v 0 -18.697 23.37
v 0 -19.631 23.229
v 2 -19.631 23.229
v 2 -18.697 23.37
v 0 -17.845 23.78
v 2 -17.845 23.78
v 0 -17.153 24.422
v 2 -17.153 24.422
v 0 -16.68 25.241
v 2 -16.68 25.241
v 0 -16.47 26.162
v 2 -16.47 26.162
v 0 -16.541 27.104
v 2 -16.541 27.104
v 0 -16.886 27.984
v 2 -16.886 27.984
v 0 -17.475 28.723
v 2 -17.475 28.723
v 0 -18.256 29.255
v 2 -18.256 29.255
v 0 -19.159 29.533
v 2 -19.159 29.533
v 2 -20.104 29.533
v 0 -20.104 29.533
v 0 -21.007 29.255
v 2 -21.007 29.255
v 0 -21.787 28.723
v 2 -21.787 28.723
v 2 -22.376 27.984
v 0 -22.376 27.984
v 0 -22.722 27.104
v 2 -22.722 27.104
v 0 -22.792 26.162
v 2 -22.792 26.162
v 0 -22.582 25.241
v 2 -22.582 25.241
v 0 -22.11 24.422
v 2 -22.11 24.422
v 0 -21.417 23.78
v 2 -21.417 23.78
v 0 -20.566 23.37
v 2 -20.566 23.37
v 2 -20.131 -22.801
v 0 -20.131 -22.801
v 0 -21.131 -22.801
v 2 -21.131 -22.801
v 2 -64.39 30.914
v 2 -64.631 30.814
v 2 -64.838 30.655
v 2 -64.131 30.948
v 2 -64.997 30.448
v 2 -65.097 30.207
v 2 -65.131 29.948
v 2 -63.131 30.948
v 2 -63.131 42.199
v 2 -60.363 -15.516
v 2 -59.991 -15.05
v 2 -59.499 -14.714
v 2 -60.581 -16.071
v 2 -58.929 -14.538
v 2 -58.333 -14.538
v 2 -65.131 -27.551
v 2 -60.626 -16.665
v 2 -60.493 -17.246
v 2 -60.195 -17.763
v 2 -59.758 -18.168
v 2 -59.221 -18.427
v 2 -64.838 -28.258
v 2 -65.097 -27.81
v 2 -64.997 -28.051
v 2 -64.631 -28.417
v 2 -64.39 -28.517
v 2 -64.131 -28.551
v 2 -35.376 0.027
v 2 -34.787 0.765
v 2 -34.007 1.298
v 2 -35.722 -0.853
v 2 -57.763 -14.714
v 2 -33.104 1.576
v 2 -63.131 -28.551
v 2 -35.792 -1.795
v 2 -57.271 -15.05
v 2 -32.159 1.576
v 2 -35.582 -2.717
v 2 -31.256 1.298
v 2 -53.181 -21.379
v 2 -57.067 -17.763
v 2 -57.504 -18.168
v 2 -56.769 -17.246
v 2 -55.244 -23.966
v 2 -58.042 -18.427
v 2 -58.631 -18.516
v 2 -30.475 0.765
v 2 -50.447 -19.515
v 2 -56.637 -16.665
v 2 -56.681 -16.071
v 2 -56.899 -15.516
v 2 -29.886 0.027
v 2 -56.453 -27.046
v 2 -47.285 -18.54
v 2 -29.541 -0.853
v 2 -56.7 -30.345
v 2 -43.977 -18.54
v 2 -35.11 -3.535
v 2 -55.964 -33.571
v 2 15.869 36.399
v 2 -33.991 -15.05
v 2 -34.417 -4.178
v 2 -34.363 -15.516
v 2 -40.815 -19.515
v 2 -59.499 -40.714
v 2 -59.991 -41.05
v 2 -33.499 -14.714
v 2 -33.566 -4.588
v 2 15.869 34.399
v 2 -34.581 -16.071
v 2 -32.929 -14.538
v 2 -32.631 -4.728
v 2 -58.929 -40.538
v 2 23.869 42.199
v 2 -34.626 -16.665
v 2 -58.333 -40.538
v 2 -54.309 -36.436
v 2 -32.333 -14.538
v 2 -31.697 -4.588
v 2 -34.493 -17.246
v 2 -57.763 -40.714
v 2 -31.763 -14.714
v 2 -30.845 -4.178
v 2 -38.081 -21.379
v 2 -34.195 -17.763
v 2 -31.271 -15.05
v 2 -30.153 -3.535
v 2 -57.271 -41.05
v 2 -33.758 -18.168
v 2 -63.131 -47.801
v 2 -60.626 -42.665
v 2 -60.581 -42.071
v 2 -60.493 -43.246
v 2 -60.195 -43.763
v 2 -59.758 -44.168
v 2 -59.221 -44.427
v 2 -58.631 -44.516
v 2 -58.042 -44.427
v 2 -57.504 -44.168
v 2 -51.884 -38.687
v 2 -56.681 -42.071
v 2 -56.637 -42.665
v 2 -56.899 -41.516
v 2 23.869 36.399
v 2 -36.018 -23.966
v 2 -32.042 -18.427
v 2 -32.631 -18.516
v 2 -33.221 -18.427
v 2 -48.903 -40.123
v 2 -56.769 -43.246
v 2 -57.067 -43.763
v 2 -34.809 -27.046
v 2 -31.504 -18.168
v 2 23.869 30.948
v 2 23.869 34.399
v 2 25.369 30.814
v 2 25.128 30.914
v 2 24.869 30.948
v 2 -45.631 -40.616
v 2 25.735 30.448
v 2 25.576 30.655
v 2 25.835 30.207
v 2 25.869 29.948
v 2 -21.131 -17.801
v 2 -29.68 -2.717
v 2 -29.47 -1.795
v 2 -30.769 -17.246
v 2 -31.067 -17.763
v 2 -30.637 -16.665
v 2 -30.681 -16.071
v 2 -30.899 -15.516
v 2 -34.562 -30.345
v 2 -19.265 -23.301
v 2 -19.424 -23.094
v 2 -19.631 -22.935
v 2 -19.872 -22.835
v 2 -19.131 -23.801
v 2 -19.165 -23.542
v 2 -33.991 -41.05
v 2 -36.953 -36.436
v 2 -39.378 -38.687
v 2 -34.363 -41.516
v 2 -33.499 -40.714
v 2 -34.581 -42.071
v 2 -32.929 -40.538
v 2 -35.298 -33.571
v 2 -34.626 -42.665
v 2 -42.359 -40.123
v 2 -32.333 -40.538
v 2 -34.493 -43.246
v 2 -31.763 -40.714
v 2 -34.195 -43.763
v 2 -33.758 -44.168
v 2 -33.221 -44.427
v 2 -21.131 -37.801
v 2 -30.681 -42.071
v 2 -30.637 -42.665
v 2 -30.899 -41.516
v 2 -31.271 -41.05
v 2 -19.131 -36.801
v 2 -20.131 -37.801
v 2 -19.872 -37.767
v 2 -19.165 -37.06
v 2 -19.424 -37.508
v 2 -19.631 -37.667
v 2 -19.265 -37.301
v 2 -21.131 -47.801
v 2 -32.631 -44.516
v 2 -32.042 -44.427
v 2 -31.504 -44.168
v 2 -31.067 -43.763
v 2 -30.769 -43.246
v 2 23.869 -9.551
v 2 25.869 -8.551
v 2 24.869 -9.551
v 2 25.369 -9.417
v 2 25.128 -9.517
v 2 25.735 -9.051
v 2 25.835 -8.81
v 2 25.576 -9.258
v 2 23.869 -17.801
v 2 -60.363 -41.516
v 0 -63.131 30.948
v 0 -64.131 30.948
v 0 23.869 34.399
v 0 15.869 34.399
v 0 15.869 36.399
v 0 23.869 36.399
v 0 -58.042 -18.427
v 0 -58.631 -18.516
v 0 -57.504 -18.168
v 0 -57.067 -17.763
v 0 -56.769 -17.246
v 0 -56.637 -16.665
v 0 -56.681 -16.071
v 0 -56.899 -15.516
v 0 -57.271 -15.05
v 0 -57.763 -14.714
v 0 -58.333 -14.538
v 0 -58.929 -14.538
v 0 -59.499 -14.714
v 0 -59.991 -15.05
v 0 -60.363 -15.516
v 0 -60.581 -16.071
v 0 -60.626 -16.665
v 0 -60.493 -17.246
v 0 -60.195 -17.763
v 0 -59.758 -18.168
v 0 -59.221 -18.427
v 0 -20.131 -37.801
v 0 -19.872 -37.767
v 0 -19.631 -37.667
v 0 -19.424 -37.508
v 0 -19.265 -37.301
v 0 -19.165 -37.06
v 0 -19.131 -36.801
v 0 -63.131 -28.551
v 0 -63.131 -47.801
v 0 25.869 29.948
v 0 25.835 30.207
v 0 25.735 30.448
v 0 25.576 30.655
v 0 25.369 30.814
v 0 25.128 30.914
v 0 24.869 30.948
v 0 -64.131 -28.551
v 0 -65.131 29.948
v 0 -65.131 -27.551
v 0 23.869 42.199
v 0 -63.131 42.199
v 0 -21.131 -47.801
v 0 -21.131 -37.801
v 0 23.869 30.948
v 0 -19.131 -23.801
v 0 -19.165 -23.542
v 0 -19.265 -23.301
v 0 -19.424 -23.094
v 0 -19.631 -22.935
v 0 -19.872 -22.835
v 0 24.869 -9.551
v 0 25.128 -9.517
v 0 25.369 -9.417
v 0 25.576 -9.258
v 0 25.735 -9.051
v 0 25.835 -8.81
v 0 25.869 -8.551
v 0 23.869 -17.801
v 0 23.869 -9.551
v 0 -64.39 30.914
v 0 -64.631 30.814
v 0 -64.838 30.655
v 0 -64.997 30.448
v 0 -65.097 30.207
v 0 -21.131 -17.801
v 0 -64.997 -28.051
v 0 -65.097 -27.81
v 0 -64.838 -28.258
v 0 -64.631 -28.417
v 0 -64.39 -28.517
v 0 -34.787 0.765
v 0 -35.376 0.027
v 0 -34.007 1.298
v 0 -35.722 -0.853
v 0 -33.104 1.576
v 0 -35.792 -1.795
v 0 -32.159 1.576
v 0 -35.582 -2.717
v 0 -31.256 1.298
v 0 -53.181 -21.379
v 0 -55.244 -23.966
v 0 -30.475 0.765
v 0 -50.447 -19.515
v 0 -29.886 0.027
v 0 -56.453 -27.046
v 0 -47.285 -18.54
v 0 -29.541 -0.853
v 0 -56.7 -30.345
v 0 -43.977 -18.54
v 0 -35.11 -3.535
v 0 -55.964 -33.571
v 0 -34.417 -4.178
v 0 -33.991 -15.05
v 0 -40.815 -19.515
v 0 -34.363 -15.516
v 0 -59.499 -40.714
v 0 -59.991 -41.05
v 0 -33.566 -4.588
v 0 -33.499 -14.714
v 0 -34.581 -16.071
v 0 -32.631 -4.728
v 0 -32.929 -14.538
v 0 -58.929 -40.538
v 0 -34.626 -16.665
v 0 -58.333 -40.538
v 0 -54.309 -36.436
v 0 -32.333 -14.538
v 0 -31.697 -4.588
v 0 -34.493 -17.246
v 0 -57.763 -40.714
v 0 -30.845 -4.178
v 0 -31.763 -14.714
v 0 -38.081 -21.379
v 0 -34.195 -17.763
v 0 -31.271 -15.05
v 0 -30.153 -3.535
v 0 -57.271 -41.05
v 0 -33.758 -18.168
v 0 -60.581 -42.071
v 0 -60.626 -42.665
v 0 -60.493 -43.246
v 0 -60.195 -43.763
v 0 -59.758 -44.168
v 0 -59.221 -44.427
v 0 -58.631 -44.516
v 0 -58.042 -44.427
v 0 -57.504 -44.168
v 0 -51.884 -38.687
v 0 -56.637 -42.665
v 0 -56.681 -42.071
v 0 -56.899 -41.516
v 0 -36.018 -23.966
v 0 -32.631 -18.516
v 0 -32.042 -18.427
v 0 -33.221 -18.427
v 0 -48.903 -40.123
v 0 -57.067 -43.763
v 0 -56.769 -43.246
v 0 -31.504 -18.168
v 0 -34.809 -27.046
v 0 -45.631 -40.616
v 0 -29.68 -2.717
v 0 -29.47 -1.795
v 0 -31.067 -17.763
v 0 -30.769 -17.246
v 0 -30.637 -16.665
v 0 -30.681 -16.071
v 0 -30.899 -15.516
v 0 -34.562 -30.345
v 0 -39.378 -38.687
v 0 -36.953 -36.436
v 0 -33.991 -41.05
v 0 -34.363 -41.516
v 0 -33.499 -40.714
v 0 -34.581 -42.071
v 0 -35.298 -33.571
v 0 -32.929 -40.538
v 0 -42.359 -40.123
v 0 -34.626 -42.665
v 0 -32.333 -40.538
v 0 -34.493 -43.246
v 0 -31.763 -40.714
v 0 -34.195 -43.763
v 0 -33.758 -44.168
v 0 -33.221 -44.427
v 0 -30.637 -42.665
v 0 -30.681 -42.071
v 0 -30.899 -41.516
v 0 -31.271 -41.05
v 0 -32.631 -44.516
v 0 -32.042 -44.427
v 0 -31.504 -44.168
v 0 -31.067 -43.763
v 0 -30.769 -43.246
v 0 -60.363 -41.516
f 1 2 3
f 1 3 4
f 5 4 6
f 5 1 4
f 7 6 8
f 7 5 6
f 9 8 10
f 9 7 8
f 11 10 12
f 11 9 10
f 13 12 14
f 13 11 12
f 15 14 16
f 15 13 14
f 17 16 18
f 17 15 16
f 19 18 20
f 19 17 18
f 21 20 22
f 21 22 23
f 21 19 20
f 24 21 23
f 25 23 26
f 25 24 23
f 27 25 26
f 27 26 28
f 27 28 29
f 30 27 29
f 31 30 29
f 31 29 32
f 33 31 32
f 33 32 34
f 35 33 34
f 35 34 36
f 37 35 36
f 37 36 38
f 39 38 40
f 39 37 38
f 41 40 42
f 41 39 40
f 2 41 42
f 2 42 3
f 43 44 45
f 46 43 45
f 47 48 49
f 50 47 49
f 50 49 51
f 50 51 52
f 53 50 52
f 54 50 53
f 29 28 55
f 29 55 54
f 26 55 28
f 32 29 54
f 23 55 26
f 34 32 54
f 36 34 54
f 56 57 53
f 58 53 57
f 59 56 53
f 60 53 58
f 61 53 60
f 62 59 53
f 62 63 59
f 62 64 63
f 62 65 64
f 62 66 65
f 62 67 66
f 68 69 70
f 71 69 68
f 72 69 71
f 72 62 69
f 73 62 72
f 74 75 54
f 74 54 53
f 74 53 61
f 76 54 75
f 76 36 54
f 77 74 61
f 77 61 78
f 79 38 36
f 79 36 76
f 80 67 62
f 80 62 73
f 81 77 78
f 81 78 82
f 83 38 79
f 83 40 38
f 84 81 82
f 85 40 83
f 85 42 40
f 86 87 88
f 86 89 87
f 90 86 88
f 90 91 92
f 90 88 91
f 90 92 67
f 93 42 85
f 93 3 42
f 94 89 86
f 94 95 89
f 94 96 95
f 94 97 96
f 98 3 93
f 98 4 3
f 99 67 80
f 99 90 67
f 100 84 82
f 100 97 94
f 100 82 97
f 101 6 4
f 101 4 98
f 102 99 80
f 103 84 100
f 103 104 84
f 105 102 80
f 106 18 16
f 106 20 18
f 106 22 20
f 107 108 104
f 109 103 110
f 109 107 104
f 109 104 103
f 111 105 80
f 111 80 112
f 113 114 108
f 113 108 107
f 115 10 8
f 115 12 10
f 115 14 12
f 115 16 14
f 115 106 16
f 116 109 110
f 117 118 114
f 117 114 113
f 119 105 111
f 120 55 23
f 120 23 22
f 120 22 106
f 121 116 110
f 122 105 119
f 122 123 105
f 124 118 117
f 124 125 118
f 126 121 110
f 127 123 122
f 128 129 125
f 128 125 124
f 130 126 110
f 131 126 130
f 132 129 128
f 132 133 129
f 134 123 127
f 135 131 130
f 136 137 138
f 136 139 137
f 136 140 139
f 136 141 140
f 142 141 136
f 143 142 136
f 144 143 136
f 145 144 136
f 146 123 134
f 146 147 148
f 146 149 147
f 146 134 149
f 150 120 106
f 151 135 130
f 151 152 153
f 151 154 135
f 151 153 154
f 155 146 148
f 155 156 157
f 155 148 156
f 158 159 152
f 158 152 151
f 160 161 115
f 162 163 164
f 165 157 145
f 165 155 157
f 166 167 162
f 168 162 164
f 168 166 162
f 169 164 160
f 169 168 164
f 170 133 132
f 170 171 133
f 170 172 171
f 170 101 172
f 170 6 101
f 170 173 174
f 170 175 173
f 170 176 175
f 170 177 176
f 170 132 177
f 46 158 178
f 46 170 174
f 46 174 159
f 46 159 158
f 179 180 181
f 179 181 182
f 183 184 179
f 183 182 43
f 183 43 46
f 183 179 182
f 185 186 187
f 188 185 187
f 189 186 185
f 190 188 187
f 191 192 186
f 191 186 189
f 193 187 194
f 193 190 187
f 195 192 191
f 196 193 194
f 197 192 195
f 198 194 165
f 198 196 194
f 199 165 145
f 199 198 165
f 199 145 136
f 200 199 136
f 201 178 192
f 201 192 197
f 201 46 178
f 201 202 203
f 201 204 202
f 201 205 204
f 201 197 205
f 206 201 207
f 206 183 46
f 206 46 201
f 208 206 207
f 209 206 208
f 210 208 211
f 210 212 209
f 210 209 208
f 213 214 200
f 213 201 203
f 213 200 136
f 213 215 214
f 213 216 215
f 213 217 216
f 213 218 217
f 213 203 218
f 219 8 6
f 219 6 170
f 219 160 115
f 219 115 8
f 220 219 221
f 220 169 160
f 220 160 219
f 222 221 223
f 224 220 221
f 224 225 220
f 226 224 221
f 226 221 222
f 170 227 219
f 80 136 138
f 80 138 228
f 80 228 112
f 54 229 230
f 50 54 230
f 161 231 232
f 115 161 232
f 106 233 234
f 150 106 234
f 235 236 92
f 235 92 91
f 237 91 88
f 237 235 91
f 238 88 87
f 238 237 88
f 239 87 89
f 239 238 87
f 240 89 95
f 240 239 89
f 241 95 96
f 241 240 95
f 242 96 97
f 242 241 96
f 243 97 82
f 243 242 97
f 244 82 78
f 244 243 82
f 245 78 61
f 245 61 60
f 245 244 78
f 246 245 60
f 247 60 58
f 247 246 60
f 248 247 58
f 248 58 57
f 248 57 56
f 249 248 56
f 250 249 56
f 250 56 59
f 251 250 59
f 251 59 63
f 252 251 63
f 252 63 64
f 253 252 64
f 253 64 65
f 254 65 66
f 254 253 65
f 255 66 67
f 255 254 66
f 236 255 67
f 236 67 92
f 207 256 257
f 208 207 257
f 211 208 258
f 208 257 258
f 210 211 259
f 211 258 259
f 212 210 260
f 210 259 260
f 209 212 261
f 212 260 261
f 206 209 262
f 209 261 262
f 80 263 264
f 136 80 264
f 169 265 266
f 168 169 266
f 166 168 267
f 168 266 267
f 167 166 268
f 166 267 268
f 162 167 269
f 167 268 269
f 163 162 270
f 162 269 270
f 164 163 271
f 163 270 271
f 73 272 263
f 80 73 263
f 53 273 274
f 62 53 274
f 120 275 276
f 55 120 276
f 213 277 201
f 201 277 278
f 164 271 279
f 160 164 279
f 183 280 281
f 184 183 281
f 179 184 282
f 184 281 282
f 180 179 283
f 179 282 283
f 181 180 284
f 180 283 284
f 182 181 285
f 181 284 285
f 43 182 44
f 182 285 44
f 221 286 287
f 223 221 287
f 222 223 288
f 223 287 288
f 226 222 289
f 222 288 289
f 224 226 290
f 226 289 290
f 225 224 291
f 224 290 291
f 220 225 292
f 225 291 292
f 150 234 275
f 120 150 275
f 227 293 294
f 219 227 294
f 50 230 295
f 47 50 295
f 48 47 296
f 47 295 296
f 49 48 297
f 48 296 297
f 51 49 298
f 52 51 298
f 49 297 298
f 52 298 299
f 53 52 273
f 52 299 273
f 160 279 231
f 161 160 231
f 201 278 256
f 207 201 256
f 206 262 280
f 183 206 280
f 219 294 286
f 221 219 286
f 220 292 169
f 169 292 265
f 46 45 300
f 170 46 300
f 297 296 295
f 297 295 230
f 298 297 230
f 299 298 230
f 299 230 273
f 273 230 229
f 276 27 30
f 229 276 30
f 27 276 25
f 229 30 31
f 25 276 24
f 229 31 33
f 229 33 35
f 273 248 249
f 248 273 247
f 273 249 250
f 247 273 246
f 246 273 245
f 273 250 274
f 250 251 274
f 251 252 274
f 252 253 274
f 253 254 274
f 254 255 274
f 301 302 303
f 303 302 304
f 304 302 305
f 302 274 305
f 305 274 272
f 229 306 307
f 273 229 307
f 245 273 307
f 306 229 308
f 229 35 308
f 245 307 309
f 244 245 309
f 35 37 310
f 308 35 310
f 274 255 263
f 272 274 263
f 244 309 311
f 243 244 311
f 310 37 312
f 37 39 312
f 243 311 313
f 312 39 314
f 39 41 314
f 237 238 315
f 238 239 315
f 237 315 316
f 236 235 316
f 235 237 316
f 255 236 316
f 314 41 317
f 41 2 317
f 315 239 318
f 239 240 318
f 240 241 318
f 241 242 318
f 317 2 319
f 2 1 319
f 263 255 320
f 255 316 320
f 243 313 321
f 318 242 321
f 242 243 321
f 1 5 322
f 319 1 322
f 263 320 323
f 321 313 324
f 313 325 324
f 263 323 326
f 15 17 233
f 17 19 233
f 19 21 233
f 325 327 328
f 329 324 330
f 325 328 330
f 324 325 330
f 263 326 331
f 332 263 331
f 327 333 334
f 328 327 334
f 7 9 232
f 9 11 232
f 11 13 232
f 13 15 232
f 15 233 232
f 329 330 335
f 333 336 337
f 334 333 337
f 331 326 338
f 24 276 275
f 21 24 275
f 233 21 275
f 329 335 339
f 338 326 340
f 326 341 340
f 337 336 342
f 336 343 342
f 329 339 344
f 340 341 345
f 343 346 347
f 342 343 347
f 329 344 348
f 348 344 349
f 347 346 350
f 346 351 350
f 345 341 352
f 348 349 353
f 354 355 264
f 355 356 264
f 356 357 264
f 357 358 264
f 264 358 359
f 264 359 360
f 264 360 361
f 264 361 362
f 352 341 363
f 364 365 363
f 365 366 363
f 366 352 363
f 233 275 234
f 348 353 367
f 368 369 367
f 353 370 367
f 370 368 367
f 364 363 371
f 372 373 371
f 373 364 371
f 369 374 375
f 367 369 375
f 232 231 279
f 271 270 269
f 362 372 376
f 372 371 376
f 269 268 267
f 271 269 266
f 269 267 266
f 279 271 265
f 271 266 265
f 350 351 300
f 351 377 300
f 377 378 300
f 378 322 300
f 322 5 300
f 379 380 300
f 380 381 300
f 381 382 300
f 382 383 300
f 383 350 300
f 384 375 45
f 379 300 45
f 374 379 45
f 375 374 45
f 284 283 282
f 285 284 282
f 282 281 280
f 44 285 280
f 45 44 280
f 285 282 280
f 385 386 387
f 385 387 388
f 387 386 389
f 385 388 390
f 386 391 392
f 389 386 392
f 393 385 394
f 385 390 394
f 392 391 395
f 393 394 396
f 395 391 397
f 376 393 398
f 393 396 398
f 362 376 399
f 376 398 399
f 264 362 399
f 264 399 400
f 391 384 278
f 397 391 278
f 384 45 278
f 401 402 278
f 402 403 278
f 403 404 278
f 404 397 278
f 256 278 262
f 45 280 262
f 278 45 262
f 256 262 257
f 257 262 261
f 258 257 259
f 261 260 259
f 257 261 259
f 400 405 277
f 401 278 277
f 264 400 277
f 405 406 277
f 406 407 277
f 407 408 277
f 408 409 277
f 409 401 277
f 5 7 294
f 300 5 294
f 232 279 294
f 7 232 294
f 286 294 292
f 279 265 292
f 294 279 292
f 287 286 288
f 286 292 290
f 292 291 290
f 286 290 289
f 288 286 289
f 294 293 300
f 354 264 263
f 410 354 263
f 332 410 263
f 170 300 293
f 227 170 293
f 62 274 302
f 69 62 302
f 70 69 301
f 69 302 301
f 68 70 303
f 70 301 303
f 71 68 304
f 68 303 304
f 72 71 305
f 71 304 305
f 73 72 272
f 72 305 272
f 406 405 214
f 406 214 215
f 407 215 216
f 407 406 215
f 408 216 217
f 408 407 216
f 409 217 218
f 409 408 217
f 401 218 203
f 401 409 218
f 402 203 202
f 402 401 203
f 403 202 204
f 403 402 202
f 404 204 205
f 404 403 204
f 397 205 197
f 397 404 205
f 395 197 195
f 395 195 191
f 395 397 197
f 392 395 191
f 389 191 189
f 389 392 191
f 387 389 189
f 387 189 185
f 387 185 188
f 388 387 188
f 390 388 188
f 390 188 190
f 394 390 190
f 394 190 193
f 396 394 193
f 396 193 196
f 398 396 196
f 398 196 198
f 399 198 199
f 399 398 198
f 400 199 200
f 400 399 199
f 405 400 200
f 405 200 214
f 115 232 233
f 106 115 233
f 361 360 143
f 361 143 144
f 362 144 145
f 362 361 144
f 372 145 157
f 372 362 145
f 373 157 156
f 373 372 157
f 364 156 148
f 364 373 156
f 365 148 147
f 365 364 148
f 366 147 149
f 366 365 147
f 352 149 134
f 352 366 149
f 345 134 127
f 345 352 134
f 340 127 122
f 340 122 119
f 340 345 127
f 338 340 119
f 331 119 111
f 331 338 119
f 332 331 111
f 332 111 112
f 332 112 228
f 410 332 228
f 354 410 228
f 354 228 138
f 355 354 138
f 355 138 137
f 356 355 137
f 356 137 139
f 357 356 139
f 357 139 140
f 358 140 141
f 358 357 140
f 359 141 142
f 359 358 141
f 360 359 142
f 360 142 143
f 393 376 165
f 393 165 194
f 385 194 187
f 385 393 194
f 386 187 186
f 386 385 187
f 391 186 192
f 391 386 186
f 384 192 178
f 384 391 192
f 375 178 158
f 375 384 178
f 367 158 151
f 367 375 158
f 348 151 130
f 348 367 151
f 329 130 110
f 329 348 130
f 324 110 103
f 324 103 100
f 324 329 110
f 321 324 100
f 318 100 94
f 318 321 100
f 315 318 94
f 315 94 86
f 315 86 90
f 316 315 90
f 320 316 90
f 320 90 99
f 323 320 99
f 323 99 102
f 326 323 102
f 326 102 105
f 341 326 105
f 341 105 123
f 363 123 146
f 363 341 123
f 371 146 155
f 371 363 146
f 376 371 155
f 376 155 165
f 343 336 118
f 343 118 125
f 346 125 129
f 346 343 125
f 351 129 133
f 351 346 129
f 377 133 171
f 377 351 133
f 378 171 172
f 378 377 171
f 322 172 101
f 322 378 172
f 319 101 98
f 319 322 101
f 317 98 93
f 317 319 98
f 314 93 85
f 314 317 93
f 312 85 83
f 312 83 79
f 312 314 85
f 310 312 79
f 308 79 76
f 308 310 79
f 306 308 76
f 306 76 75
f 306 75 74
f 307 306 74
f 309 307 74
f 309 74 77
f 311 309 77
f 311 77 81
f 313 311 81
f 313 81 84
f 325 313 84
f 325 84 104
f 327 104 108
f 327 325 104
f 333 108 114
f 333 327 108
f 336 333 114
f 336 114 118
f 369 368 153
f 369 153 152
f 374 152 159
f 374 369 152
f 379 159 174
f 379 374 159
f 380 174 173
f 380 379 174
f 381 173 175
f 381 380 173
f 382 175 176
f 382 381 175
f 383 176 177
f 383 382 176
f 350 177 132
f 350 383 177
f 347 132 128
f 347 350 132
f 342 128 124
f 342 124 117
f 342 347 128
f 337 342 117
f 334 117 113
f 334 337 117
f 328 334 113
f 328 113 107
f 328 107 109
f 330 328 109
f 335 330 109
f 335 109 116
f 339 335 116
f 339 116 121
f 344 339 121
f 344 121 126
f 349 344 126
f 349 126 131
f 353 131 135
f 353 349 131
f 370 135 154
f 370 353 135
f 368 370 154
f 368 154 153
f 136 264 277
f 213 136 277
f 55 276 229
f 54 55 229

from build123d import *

# Parameters (mm, degrees)
SKETCH1_R           = 3.17
SKETCH1_R_2         = 11.1
SKETCH1_R_3         = 2
BOSS_EXTRUDE2_DEPTH = 2


with BuildPart() as part:
    # Sketch1 → Boss-Extrude2 (new body)
    with BuildSketch(Plane(origin=(0, 0, 0), x_dir=(0, 0, -1), z_dir=(1, 0, 0))):
        with BuildLine():
            Line((47.801233781, -63.131130768), (47.801233781, -21.131130768))
            Line((47.801233781, -21.131130768), (37.801233781, -21.131130768))
            Line((37.801233781, -21.131130768), (37.801233781, -20.131130768))
            ThreePointArc((37.801233781, -20.131130768), (37.508340562, -19.424023986), (36.801233781, -19.131130768))
            Line((36.801233781, -19.131130768), (23.801233781, -19.131130768))
            ThreePointArc((23.801233781, -19.131130768), (23.094127, -19.424023986), (22.801233781, -20.131130768))
            Line((22.801233781, -20.131130768), (22.801233781, -21.131130768))
            Line((22.801233781, -21.131130768), (17.801233781, -21.131130768))
            Line((17.801233781, -21.131130768), (17.801233781, 23.868869232))
            Line((17.801233781, 23.868869232), (9.55072491, 23.868869232))
            Line((9.55072491, 23.868869232), (9.55072491, 24.868869232))
            ThreePointArc((9.55072491, 24.868869232), (9.257831691, 25.575976014), (8.55072491, 25.868869232))
            Line((8.55072491, 25.868869232), (-29.948257347, 25.868869232))
            ThreePointArc((-29.948257347, 25.868869232), (-30.655364129, 25.575976014), (-30.948257347, 24.868869232))
            Line((-30.948257347, 24.868869232), (-30.948257347, 23.868869232))
            Line((-30.948257347, 23.868869232), (-34.398766219, 23.868869232))
            Line((-34.398766219, 23.868869232), (-34.398766219, 15.868869232))
            Line((-34.398766219, 15.868869232), (-36.398766219, 15.868869232))
            Line((-36.398766219, 15.868869232), (-36.398766219, 23.868869232))
            Line((-36.398766219, 23.868869232), (-42.198766219, 23.868869232))
            Line((-42.198766219, 23.868869232), (-42.198766219, -63.131130768))
            Line((-42.198766219, -63.131130768), (-30.948257347, -63.131130768))
            Line((-30.948257347, -63.131130768), (-30.948257347, -64.131130768))
            ThreePointArc((-30.948257347, -64.131130768), (-30.655364129, -64.838237549), (-29.948257347, -65.131130768))
            Line((-29.948257347, -65.131130768), (27.55072491, -65.131130768))
            ThreePointArc((27.55072491, -65.131130768), (28.257831691, -64.838237549), (28.55072491, -64.131130768))
            Line((28.55072491, -64.131130768), (28.55072491, -63.131130768))
            Line((28.55072491, -63.131130768), (47.801233781, -63.131130768))
        make_face()
        with Locations((-26.398766219, -19.631130768)):
            Circle(SKETCH1_R, mode=Mode.SUBTRACT)
        with Locations((29.515713155, -45.631130768)):
            Circle(SKETCH1_R_2, mode=Mode.SUBTRACT)
        with Locations((16.515713155, -32.631130768)):
            Circle(SKETCH1_R_3, mode=Mode.SUBTRACT)
        with Locations((42.515713155, -32.631130768)):
            Circle(SKETCH1_R_3, mode=Mode.SUBTRACT)
        with Locations((42.515713155, -58.631130768)):
            Circle(SKETCH1_R_3, mode=Mode.SUBTRACT)
        with Locations((16.515713155, -58.631130768)):
            Circle(SKETCH1_R_3, mode=Mode.SUBTRACT)
        with Locations((1.558473468, -32.631130768)):
            Circle(SKETCH1_R, mode=Mode.SUBTRACT)
    extrude(amount=BOSS_EXTRUDE2_DEPTH)


solid = part.part
